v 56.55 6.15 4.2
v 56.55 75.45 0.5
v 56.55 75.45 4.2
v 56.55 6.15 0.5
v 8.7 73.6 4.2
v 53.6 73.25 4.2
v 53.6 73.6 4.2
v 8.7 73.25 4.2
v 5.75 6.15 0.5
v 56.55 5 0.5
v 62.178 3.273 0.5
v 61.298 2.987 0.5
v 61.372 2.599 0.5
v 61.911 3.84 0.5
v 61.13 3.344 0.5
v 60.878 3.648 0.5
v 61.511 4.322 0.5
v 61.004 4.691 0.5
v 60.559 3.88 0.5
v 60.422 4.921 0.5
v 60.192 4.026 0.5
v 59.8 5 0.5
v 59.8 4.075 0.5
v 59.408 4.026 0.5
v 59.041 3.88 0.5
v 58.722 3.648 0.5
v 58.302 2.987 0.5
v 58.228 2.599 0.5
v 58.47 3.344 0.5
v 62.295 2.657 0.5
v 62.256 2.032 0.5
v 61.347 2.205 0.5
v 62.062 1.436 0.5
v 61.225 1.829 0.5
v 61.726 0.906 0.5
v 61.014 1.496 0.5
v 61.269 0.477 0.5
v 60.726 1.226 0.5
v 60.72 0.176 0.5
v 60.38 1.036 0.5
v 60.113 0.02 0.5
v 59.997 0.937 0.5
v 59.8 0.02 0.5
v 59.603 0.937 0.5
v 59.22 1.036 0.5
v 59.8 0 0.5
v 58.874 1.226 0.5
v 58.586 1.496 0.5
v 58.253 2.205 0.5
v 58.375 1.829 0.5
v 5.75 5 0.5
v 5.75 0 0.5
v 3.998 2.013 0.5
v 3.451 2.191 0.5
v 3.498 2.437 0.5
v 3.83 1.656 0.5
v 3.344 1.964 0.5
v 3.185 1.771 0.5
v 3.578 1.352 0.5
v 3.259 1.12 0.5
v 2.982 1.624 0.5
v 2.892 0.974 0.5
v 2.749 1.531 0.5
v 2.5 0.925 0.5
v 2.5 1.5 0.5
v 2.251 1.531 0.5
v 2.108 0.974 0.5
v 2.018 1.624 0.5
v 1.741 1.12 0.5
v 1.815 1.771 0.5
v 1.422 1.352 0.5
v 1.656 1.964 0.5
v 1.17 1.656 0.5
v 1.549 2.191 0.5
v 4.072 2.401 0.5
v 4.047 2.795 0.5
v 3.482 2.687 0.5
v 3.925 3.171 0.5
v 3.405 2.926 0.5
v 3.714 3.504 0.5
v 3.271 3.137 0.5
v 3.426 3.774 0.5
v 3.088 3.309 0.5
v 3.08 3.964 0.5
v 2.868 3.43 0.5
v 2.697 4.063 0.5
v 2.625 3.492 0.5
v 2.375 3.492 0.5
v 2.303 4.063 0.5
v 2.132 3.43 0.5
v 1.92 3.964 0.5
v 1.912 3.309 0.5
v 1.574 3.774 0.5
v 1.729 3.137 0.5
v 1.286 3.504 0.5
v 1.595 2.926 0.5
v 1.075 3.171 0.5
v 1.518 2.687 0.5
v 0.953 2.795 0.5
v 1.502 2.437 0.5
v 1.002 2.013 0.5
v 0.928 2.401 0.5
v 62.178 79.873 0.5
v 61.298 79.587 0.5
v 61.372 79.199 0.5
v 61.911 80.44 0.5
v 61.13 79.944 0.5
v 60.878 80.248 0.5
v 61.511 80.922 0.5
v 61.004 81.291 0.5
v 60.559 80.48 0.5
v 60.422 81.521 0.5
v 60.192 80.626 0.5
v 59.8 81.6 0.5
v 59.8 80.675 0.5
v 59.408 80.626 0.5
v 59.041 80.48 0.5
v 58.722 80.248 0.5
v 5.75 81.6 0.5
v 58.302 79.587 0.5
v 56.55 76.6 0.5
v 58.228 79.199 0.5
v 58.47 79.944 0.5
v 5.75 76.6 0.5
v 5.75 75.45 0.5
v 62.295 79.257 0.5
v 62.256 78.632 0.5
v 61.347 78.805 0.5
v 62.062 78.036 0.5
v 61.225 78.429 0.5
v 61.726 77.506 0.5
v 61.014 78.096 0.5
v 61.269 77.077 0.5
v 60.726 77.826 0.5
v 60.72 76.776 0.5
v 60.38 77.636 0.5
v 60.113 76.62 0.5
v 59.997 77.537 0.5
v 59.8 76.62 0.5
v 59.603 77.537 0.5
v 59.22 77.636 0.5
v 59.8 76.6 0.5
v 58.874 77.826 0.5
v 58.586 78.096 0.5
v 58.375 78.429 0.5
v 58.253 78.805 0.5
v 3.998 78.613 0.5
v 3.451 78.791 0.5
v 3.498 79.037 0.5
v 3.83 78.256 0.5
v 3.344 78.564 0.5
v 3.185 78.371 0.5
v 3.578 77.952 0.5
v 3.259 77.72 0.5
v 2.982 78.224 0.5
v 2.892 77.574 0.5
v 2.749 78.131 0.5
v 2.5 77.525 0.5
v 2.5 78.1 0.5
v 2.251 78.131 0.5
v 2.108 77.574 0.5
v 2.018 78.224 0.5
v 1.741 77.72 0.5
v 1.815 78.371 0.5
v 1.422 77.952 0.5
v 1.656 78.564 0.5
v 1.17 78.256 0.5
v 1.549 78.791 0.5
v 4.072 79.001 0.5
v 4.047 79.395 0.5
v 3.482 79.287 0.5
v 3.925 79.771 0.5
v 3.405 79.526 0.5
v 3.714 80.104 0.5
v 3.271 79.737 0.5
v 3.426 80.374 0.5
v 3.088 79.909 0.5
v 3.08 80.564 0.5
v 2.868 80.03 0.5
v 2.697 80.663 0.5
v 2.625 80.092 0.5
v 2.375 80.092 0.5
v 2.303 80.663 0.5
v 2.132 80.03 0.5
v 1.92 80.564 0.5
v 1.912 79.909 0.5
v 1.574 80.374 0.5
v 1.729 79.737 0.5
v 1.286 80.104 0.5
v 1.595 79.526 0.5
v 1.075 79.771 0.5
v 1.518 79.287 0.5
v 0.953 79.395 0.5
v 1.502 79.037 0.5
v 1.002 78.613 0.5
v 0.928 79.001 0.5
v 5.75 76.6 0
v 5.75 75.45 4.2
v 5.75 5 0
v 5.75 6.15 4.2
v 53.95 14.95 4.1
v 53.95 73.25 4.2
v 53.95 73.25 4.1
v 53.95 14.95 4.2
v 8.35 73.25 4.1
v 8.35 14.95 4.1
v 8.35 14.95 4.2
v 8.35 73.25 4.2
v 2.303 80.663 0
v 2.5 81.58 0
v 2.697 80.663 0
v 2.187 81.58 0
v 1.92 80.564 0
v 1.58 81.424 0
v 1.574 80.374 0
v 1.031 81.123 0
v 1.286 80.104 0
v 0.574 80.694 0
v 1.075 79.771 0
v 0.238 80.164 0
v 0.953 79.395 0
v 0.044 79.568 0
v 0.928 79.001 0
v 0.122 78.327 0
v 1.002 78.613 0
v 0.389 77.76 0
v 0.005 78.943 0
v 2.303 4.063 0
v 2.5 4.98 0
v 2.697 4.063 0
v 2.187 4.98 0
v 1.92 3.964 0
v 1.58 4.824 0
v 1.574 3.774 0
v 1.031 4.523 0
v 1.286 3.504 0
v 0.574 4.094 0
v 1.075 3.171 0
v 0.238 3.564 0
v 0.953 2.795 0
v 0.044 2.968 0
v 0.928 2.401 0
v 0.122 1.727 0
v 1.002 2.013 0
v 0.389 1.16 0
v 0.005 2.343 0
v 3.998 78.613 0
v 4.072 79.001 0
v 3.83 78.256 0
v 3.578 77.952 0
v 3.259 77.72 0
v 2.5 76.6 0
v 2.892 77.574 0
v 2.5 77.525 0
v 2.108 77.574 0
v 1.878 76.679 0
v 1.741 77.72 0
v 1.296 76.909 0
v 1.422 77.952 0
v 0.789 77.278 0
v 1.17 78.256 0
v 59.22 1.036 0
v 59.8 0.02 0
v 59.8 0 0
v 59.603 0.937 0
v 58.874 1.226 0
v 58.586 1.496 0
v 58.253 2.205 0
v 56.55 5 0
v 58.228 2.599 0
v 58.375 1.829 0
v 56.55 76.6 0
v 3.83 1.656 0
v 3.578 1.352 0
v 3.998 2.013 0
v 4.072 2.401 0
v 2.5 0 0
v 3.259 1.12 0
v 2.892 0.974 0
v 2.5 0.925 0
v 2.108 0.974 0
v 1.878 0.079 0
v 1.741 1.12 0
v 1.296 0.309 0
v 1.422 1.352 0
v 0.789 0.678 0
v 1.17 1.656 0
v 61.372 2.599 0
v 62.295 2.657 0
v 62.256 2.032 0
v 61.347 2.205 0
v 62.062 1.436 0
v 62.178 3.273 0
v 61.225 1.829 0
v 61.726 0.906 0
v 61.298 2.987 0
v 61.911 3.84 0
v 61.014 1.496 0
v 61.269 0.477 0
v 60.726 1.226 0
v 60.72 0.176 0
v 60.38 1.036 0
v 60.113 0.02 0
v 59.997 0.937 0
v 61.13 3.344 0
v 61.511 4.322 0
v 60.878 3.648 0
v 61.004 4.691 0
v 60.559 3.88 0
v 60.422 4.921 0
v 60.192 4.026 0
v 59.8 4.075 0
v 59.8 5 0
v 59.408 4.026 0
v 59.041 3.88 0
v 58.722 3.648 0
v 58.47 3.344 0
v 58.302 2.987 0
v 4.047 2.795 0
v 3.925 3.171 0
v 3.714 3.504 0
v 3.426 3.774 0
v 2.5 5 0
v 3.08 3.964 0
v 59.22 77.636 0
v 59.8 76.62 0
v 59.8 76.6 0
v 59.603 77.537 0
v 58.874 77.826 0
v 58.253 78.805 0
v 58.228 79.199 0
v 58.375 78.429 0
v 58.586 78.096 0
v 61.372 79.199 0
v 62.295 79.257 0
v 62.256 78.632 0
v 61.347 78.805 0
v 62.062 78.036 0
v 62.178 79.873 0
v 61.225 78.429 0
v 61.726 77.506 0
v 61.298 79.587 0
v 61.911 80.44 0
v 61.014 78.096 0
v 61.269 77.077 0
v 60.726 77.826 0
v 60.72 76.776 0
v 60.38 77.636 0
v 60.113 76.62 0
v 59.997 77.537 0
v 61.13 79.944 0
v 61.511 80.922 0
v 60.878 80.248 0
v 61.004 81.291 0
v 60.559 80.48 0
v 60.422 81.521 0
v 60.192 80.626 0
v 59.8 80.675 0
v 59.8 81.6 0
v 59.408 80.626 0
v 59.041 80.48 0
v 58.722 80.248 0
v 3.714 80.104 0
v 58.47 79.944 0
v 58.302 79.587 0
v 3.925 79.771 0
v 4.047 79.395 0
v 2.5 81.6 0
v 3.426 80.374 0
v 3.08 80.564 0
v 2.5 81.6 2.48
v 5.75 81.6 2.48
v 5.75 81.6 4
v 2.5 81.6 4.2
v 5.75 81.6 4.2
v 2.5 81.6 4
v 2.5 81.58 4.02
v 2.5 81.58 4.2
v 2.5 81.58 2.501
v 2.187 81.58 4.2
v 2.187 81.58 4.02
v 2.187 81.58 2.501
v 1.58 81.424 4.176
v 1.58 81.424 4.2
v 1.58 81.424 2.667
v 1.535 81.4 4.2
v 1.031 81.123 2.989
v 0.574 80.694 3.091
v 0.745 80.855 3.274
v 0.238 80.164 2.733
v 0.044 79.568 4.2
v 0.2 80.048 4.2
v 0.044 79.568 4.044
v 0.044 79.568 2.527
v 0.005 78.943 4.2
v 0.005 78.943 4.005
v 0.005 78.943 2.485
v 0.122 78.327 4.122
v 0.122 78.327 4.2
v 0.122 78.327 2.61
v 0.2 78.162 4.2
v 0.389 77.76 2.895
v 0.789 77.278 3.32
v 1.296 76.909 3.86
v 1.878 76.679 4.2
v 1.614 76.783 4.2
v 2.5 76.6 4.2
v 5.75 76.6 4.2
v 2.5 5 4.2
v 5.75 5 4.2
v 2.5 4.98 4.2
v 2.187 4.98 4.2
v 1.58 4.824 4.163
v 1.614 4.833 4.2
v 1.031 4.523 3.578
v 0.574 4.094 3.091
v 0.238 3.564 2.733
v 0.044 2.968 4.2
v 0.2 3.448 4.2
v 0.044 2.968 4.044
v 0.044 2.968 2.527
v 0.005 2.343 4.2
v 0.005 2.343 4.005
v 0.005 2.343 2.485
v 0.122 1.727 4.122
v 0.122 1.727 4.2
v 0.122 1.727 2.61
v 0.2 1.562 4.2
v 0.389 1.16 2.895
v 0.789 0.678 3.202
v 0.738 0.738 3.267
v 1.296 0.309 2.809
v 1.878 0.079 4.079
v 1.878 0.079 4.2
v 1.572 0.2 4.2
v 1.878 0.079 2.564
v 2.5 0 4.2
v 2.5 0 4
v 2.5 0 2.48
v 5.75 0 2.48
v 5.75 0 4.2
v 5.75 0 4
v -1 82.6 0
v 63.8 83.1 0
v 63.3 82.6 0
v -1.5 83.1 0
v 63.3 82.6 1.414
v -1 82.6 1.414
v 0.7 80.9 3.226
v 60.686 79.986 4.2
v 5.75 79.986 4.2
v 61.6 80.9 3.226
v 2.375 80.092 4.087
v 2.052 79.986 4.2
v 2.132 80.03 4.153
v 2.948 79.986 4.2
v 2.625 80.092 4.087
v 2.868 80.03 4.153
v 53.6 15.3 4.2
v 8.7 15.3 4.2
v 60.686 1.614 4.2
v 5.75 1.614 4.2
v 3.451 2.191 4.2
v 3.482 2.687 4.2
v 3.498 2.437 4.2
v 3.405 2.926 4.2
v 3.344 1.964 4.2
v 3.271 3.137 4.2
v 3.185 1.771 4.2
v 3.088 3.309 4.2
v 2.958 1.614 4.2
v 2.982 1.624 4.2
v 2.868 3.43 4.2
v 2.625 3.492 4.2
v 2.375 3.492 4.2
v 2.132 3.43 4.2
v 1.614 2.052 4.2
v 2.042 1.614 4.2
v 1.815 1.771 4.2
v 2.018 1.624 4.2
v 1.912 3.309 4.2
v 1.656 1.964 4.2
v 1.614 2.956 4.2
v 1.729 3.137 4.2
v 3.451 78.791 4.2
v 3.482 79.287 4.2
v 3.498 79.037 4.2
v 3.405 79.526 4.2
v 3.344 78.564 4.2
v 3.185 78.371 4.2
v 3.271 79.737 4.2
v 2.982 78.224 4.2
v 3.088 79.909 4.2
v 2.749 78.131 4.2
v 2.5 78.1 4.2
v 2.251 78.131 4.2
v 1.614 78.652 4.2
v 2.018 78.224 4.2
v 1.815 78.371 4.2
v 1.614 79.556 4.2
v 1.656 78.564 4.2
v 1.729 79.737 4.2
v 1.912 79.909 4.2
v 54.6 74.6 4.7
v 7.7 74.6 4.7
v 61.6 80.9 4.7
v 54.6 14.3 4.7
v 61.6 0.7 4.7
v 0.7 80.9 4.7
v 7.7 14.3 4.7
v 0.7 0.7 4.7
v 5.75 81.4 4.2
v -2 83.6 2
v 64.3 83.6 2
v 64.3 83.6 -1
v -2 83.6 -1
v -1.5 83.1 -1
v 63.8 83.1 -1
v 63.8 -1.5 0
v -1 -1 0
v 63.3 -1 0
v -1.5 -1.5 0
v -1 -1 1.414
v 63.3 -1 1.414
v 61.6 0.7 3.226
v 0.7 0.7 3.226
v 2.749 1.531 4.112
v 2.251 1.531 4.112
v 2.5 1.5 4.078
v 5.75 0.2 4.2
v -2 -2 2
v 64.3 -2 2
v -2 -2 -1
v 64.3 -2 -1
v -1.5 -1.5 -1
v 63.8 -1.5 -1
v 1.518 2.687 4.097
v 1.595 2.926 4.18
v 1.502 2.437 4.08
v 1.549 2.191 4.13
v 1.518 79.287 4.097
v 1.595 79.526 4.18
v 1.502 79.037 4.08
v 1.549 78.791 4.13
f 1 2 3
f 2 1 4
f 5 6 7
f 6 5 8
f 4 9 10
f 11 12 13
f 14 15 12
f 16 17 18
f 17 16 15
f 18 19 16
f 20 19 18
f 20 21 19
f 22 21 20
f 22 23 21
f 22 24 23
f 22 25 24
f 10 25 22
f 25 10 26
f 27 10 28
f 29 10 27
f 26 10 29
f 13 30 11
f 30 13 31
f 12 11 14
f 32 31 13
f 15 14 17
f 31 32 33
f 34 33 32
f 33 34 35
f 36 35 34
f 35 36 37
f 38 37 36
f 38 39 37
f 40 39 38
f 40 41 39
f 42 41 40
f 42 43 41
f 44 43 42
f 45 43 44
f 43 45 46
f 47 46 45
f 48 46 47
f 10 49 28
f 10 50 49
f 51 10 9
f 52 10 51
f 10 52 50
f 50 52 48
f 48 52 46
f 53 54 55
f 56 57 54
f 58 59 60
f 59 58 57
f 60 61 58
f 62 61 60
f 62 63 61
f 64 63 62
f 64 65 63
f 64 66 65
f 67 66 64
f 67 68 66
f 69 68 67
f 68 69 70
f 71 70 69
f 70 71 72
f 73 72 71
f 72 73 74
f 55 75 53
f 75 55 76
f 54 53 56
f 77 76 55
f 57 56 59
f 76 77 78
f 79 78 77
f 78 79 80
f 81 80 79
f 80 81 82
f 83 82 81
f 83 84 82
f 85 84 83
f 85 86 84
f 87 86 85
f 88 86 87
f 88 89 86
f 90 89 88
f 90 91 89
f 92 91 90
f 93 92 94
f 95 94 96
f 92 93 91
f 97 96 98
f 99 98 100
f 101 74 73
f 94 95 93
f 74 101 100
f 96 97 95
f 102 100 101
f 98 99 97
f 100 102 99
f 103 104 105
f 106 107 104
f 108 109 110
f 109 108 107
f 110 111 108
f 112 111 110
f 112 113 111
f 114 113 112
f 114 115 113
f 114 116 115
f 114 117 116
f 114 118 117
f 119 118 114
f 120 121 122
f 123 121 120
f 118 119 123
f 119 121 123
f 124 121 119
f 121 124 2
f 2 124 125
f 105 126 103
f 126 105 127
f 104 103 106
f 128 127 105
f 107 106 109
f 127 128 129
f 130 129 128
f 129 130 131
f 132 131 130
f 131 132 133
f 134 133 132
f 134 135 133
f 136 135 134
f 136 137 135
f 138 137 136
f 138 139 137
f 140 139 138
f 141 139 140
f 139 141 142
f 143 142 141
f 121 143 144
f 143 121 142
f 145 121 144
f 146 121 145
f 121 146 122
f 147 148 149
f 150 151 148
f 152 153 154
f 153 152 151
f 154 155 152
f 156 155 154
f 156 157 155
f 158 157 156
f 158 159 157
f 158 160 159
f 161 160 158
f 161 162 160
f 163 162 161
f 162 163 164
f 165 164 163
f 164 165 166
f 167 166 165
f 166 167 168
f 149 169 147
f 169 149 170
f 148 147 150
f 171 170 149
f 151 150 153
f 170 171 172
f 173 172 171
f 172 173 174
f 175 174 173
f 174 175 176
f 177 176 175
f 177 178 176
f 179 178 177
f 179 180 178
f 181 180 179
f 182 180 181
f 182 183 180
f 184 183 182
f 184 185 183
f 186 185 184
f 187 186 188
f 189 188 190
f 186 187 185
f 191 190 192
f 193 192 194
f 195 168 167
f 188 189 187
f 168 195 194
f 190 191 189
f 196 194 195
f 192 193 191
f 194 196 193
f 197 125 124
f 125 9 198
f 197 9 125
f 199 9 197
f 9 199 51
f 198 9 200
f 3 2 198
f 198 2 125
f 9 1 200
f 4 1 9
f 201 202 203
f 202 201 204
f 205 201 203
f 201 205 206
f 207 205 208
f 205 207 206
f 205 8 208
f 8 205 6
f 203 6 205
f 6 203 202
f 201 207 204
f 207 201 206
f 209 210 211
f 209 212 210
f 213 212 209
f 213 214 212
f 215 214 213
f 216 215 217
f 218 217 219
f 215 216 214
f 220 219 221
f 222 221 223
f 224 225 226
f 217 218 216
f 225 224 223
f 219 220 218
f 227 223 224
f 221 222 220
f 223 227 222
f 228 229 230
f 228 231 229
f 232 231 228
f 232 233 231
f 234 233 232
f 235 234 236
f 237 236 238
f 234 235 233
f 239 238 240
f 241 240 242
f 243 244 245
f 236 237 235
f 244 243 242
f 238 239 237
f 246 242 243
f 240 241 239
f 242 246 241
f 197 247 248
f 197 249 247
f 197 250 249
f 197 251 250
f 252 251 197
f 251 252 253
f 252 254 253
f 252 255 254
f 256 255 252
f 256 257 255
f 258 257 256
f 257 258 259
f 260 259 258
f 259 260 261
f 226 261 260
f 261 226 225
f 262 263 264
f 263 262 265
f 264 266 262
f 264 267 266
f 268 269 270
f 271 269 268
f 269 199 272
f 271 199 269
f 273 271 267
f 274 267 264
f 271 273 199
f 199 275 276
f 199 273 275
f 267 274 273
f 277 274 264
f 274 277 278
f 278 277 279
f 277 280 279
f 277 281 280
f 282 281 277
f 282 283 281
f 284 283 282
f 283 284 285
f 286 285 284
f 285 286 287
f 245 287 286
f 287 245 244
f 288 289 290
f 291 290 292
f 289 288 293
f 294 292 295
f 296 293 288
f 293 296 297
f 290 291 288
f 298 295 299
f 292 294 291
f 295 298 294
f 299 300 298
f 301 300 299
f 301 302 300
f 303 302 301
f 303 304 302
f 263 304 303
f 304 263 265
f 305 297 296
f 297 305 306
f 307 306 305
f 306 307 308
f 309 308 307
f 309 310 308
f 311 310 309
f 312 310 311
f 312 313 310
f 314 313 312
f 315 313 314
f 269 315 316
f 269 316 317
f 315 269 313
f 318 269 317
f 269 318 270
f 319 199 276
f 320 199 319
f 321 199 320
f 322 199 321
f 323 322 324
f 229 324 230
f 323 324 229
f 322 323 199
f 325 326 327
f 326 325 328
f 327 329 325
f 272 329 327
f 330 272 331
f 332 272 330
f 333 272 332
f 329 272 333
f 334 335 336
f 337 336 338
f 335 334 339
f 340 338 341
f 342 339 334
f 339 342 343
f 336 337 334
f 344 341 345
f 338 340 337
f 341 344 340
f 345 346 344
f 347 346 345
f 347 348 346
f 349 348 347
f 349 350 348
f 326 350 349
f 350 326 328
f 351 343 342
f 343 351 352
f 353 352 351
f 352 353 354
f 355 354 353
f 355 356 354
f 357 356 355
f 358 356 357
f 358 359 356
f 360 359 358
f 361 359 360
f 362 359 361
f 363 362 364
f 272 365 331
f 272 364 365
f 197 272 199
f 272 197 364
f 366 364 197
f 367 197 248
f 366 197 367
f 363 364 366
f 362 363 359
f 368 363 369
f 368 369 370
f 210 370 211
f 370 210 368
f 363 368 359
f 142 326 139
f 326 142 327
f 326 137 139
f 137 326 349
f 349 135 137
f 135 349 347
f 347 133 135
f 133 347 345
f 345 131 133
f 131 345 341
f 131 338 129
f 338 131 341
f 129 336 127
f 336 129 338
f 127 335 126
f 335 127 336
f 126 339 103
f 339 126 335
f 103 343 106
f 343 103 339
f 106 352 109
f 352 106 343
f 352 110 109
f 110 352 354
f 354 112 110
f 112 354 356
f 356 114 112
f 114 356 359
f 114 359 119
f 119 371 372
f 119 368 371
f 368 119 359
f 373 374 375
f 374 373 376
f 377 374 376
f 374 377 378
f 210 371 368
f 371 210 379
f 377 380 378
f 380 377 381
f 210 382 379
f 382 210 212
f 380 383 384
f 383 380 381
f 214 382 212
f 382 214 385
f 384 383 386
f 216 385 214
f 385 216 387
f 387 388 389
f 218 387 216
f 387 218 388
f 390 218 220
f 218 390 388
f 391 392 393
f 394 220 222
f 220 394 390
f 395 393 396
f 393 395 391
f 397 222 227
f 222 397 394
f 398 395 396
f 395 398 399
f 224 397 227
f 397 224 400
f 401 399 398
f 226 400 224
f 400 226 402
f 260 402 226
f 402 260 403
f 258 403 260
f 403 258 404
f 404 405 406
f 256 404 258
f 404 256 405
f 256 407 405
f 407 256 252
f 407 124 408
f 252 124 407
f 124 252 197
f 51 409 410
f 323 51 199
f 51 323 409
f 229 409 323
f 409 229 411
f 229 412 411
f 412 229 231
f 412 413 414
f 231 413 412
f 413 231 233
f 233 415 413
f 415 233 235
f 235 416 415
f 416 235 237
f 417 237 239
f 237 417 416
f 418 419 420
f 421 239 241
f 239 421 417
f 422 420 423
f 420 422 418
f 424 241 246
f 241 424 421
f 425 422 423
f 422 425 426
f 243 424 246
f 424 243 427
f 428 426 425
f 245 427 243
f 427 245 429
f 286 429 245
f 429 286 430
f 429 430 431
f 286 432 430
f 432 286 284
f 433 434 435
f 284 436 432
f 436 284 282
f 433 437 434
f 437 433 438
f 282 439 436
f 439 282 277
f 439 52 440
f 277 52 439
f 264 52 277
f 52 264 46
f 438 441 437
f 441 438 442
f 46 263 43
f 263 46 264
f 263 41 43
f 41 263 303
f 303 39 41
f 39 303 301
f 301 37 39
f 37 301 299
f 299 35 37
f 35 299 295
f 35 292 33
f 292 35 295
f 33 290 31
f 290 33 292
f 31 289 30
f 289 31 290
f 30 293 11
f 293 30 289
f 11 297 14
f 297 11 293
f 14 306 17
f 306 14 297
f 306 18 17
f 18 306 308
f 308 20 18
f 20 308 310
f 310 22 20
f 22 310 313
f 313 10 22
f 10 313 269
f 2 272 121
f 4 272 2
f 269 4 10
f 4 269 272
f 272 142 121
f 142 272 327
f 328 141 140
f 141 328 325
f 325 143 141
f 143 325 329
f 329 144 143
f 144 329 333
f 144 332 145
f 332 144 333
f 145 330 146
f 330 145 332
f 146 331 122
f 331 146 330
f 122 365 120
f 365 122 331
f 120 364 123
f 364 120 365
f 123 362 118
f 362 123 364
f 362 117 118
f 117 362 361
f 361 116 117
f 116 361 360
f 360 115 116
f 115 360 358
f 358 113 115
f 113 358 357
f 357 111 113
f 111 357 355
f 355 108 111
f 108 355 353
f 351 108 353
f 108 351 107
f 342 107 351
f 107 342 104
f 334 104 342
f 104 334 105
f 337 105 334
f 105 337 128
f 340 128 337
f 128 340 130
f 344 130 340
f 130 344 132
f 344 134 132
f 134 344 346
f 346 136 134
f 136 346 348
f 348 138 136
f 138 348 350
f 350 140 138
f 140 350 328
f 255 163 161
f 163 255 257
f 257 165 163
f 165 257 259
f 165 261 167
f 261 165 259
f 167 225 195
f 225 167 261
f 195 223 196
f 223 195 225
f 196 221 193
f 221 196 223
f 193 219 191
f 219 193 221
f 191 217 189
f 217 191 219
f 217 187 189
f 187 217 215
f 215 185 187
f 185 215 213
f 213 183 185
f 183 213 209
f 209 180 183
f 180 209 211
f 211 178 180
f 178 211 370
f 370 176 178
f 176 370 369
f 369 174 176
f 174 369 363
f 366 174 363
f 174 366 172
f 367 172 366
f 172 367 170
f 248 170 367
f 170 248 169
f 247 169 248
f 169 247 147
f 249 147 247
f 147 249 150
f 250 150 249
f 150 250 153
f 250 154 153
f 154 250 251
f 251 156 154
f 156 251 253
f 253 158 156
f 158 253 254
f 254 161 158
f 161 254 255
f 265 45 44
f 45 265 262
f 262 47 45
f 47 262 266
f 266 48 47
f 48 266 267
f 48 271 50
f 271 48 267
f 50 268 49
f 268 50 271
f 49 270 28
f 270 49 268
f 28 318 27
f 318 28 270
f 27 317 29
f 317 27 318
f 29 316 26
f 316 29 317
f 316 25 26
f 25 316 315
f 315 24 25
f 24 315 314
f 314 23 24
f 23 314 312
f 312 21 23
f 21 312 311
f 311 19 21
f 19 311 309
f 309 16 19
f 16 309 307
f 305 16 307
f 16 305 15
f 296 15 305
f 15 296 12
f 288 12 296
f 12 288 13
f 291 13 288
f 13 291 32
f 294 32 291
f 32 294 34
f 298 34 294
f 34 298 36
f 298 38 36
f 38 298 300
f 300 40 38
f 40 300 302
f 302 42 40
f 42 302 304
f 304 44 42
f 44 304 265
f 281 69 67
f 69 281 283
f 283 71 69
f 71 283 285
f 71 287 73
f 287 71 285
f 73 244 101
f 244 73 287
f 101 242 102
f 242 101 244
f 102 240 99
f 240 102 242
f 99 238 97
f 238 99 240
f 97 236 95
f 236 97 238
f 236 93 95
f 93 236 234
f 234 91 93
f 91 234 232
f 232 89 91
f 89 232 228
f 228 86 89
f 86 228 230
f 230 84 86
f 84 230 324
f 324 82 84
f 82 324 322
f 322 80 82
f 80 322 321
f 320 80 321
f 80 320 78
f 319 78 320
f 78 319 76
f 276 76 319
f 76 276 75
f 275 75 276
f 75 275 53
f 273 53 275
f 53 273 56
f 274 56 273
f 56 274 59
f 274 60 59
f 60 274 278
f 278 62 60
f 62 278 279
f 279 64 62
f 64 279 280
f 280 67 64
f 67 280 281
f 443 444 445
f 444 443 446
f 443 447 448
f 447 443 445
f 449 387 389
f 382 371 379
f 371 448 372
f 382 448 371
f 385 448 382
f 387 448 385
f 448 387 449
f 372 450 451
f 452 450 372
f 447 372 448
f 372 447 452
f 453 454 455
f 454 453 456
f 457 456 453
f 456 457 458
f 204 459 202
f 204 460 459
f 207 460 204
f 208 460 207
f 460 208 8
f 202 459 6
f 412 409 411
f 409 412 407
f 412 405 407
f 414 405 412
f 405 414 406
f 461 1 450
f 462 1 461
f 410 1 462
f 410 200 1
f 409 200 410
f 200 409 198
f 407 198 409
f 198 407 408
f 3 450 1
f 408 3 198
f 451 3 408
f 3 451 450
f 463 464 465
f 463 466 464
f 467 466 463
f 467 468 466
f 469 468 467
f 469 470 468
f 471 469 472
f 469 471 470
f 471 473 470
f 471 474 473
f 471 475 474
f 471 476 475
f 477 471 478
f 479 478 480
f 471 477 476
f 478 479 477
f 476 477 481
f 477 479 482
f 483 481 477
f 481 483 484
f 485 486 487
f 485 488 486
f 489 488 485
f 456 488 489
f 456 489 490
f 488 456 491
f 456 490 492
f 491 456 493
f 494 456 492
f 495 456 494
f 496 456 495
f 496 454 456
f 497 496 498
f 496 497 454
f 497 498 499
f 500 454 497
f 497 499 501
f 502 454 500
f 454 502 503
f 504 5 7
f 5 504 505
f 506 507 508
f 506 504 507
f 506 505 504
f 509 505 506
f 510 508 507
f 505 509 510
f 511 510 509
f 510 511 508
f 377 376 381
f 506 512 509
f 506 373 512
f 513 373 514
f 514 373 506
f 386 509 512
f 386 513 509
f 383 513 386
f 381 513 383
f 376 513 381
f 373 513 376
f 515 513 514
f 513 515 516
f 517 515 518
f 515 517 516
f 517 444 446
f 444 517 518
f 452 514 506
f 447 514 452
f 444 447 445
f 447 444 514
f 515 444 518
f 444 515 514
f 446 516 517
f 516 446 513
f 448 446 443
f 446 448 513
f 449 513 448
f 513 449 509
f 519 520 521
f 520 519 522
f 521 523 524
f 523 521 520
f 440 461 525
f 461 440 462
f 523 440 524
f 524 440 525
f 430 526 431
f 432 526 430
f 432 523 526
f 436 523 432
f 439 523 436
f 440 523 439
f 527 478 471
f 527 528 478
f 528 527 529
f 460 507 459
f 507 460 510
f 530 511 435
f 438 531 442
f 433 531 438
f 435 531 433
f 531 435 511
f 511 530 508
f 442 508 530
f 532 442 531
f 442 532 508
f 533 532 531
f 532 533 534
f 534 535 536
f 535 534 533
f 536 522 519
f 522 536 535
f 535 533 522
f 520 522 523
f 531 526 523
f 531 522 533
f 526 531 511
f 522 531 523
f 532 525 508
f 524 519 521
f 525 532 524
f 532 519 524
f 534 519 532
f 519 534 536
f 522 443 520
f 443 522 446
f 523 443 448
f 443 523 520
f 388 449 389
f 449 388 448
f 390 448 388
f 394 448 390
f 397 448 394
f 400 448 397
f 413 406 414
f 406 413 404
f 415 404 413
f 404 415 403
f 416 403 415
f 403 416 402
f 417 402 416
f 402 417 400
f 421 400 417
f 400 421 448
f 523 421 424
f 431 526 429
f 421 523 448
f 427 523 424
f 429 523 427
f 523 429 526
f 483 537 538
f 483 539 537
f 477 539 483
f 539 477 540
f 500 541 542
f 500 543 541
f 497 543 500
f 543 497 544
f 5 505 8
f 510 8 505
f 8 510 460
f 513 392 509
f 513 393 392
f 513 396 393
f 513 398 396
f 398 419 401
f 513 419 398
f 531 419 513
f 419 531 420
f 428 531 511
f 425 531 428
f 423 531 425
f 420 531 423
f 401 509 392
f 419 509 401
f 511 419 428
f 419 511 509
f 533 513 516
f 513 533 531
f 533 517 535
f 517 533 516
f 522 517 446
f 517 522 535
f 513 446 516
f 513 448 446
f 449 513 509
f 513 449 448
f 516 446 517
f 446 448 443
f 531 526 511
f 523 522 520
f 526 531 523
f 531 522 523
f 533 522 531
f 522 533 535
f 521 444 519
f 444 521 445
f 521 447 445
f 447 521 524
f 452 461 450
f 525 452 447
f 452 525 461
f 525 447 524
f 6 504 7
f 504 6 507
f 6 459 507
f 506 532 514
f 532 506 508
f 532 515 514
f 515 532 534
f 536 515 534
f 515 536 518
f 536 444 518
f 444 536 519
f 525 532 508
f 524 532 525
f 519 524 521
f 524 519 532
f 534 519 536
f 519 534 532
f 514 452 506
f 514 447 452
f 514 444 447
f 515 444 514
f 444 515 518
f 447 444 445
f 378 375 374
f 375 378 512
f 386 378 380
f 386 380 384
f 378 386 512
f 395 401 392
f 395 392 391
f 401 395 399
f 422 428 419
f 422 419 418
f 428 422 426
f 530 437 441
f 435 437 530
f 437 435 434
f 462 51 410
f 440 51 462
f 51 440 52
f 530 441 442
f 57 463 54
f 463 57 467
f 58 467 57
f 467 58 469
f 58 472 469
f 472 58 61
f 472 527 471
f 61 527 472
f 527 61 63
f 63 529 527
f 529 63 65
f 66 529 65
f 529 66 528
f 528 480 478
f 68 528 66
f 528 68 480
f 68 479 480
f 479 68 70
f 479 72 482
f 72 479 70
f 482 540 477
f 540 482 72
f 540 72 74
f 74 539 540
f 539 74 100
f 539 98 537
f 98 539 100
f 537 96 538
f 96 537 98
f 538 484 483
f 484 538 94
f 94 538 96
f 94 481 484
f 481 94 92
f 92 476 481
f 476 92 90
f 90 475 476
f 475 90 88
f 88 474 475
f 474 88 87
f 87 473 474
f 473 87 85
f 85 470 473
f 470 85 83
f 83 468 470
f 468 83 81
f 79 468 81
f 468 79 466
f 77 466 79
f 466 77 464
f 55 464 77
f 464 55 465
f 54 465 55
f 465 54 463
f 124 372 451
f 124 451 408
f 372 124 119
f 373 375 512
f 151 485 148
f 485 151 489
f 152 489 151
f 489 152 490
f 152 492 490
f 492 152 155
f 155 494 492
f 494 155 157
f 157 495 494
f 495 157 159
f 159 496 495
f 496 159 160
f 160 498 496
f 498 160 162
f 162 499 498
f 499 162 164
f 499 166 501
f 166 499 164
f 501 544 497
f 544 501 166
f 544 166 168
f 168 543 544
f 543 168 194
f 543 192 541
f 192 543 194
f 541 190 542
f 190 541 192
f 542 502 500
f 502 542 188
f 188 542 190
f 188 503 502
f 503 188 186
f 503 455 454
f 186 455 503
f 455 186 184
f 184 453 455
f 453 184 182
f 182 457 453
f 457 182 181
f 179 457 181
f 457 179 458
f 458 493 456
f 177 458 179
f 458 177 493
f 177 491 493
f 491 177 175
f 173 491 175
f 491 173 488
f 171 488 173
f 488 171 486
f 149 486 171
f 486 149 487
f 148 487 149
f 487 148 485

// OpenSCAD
SCREEN_WIDTH = 45.6;
SCREEN_HEIGHT = 58.3;
HOLE_DIAMETER = 3.15;
DISPLAY_BOARD_WIDTH_OUTER = 62.3;
DISPLAY_BOARD_WIDTH_INNER = 50.8;
DISPLAY_BOARD_HEIGHT = 81.6;
DISPLAY_BOARD_DEPTH = 0.50;
DISPLAY_DEPTH = 3.7;
DISPLAY_WIDTH = 50.2;
DISPLAY_HEIGHT = 69.3;

DISPLAY_MOUNT_RECT_LENGTH = 3.25;
DISPLAY_MOUNT_RECT_WIDTH = 5.00;

BEZEL_TOP = 10.00;
BEZEL_LEFT = 8.70;
BEZEL_BOTTOM = 13.3;
BEZEL_RIGHT = 8.70;

TOTAL_DEPTH = DISPLAY_DEPTH + DISPLAY_BOARD_DEPTH + 0.5;

SCREEN_CENTER = [
    DISPLAY_BOARD_WIDTH_OUTER / 2,
    (DISPLAY_BOARD_HEIGHT / 2) + (BEZEL_BOTTOM - BEZEL_TOP)
];

// Clipped Draw Side
module drawSide(height, width, length) {
    intersection() {
        rotate([90, 0, 0]) {
            linear_extrude(
                height = length) {
                    polygon([
                             [0.00, -1.00],
                             [0.00, 2.00],
                             [height - 2.00, height],
                             [width - 1.00, height],
                             [width, height - 0.50],
                             [height - 2.50 + sqrt(2), height - 0.50],
                             [1.00, sqrt(2)],
                             [1.00, 0.00],
                             [0.50, 0.00],
                             [0.50, -1.00]]);
            }
        }
        linear_extrude(height = height * 3, center = true) {
            polygon([[0, 0],
                     [height - 2, -(height - 2)],
                     [width, -(height - 2)],
                     [width, -(length - (height - 2))],
                     [height - 2, -(length - (height - 2))],
                     [0, -length]]);
        }
    }
}

module drawDisplayMount(rect_width, rect_length, diameter) {
    translate([rect_width, rect_length, 0]) {
        rotate([0, 0, 180]) {
            circle_tx = [rect_width / 2, 0, 0];
            difference() {
                union() {
                    square([rect_width, rect_length]);
                    translate(circle_tx) {
                            circle(d = rect_width, $fn = 25);
                        }
                }
                translate(circle_tx) {
                    circle(d = diameter, $fn = 25);
                }
            }
        }
    }
}

module drawDisplayMountBoard() {
    drawDisplayMount(DISPLAY_MOUNT_RECT_WIDTH, DISPLAY_MOUNT_RECT_LENGTH, HOLE_DIAMETER);
}

module drawDisplayMountSide(rect_width, rect_length, diameter) {
    drawDisplayMount(rect_width, rect_length, diameter);
    translate([DISPLAY_BOARD_HEIGHT - rect_width, 0, 0]) {
        drawDisplayMount(rect_width, rect_length, diameter);
    }
}

module drawDisplayBoardMountSide() {
    drawDisplayMountSide(DISPLAY_MOUNT_RECT_WIDTH, DISPLAY_MOUNT_RECT_LENGTH, HOLE_DIAMETER);
}

module drawDisplayModule() {
    translate([DISPLAY_MOUNT_RECT_LENGTH + (DISPLAY_MOUNT_RECT_WIDTH / 2), 0, 0]) {
        union() {
            linear_extrude(height = DISPLAY_BOARD_DEPTH) {
                    union() {
                        square([DISPLAY_BOARD_WIDTH_INNER,
                               DISPLAY_BOARD_HEIGHT]);
                        translate([DISPLAY_BOARD_WIDTH_INNER, DISPLAY_BOARD_HEIGHT, 0]) {
                            rotate([0, 0, 270]) {
                                drawDisplayBoardMountSide();
                            }
                        }
                        translate([0, 0, 0]) {
                            rotate([0, 0, 90]) {
                                drawDisplayBoardMountSide();
                            }
                        }
                    }
            }
            translate([0,(DISPLAY_BOARD_HEIGHT - DISPLAY_HEIGHT) / 2,DISPLAY_BOARD_DEPTH]) {
                difference() {
                    cube([DISPLAY_BOARD_WIDTH_INNER,
                          DISPLAY_HEIGHT,
                          DISPLAY_DEPTH]);
                    translate([(DISPLAY_BOARD_WIDTH_INNER / 2) - (SCREEN_WIDTH / 2),
                               (DISPLAY_HEIGHT / 2) - (SCREEN_HEIGHT / 2) + BEZEL_BOTTOM - BEZEL_TOP,
                               DISPLAY_DEPTH - 0.1]) {
                        cube([SCREEN_WIDTH,
                              SCREEN_HEIGHT,
                              10]);
                    }
                }
            }
        }
    }
}

module drawScreenCenter() {
    translate([SCREEN_CENTER[0], SCREEN_CENTER[1], 0]) {
        cylinder(10, r=1);
    }
}

module drawTopHalf() {

    // Draw Top Side
    translate([2, DISPLAY_BOARD_HEIGHT - BEZEL_TOP, 0]) {
        translate([DISPLAY_BOARD_WIDTH_OUTER, BEZEL_TOP + 2, 0]) {
            rotate([0, 0, 270]) {
                drawSide(TOTAL_DEPTH, BEZEL_TOP, DISPLAY_BOARD_WIDTH_OUTER + 4);
            }
        }
    }

    // Draw Bottom Side
    translate([-2, -2, 0]) {
        translate([0, 0, 0]) {
            rotate([0, 0, 90]) {
                drawSide(TOTAL_DEPTH, BEZEL_BOTTOM + 4, DISPLAY_BOARD_WIDTH_OUTER + 4);
            }
        }
    }

    // Draw Left Side
    translate([-2, DISPLAY_BOARD_HEIGHT + 2, 0]) {
        drawSide(TOTAL_DEPTH, BEZEL_LEFT + 2, DISPLAY_BOARD_HEIGHT + 4);
    }

    // Draw Right Side
    translate([DISPLAY_BOARD_WIDTH_OUTER, 0, 0]) {
        translate([2, -2, 0]) {
            rotate([0, 0, 180]) {
                drawSide(TOTAL_DEPTH, BEZEL_RIGHT + 2, DISPLAY_BOARD_HEIGHT + 4);
            }
        }
    }

    // Draw Left Side Mounts
    translate([DISPLAY_MOUNT_RECT_LENGTH + (DISPLAY_MOUNT_RECT_WIDTH / 2), 0, DISPLAY_BOARD_DEPTH]) {
        rotate([0, 0, 90]) {
            linear_extrude(height = DISPLAY_DEPTH) {
                drawDisplayMountSide(DISPLAY_MOUNT_RECT_WIDTH, DISPLAY_MOUNT_RECT_LENGTH, 2);
            }
        }
    }
}

*drawScreenCenter();

drawDisplayModule();
drawTopHalf();
